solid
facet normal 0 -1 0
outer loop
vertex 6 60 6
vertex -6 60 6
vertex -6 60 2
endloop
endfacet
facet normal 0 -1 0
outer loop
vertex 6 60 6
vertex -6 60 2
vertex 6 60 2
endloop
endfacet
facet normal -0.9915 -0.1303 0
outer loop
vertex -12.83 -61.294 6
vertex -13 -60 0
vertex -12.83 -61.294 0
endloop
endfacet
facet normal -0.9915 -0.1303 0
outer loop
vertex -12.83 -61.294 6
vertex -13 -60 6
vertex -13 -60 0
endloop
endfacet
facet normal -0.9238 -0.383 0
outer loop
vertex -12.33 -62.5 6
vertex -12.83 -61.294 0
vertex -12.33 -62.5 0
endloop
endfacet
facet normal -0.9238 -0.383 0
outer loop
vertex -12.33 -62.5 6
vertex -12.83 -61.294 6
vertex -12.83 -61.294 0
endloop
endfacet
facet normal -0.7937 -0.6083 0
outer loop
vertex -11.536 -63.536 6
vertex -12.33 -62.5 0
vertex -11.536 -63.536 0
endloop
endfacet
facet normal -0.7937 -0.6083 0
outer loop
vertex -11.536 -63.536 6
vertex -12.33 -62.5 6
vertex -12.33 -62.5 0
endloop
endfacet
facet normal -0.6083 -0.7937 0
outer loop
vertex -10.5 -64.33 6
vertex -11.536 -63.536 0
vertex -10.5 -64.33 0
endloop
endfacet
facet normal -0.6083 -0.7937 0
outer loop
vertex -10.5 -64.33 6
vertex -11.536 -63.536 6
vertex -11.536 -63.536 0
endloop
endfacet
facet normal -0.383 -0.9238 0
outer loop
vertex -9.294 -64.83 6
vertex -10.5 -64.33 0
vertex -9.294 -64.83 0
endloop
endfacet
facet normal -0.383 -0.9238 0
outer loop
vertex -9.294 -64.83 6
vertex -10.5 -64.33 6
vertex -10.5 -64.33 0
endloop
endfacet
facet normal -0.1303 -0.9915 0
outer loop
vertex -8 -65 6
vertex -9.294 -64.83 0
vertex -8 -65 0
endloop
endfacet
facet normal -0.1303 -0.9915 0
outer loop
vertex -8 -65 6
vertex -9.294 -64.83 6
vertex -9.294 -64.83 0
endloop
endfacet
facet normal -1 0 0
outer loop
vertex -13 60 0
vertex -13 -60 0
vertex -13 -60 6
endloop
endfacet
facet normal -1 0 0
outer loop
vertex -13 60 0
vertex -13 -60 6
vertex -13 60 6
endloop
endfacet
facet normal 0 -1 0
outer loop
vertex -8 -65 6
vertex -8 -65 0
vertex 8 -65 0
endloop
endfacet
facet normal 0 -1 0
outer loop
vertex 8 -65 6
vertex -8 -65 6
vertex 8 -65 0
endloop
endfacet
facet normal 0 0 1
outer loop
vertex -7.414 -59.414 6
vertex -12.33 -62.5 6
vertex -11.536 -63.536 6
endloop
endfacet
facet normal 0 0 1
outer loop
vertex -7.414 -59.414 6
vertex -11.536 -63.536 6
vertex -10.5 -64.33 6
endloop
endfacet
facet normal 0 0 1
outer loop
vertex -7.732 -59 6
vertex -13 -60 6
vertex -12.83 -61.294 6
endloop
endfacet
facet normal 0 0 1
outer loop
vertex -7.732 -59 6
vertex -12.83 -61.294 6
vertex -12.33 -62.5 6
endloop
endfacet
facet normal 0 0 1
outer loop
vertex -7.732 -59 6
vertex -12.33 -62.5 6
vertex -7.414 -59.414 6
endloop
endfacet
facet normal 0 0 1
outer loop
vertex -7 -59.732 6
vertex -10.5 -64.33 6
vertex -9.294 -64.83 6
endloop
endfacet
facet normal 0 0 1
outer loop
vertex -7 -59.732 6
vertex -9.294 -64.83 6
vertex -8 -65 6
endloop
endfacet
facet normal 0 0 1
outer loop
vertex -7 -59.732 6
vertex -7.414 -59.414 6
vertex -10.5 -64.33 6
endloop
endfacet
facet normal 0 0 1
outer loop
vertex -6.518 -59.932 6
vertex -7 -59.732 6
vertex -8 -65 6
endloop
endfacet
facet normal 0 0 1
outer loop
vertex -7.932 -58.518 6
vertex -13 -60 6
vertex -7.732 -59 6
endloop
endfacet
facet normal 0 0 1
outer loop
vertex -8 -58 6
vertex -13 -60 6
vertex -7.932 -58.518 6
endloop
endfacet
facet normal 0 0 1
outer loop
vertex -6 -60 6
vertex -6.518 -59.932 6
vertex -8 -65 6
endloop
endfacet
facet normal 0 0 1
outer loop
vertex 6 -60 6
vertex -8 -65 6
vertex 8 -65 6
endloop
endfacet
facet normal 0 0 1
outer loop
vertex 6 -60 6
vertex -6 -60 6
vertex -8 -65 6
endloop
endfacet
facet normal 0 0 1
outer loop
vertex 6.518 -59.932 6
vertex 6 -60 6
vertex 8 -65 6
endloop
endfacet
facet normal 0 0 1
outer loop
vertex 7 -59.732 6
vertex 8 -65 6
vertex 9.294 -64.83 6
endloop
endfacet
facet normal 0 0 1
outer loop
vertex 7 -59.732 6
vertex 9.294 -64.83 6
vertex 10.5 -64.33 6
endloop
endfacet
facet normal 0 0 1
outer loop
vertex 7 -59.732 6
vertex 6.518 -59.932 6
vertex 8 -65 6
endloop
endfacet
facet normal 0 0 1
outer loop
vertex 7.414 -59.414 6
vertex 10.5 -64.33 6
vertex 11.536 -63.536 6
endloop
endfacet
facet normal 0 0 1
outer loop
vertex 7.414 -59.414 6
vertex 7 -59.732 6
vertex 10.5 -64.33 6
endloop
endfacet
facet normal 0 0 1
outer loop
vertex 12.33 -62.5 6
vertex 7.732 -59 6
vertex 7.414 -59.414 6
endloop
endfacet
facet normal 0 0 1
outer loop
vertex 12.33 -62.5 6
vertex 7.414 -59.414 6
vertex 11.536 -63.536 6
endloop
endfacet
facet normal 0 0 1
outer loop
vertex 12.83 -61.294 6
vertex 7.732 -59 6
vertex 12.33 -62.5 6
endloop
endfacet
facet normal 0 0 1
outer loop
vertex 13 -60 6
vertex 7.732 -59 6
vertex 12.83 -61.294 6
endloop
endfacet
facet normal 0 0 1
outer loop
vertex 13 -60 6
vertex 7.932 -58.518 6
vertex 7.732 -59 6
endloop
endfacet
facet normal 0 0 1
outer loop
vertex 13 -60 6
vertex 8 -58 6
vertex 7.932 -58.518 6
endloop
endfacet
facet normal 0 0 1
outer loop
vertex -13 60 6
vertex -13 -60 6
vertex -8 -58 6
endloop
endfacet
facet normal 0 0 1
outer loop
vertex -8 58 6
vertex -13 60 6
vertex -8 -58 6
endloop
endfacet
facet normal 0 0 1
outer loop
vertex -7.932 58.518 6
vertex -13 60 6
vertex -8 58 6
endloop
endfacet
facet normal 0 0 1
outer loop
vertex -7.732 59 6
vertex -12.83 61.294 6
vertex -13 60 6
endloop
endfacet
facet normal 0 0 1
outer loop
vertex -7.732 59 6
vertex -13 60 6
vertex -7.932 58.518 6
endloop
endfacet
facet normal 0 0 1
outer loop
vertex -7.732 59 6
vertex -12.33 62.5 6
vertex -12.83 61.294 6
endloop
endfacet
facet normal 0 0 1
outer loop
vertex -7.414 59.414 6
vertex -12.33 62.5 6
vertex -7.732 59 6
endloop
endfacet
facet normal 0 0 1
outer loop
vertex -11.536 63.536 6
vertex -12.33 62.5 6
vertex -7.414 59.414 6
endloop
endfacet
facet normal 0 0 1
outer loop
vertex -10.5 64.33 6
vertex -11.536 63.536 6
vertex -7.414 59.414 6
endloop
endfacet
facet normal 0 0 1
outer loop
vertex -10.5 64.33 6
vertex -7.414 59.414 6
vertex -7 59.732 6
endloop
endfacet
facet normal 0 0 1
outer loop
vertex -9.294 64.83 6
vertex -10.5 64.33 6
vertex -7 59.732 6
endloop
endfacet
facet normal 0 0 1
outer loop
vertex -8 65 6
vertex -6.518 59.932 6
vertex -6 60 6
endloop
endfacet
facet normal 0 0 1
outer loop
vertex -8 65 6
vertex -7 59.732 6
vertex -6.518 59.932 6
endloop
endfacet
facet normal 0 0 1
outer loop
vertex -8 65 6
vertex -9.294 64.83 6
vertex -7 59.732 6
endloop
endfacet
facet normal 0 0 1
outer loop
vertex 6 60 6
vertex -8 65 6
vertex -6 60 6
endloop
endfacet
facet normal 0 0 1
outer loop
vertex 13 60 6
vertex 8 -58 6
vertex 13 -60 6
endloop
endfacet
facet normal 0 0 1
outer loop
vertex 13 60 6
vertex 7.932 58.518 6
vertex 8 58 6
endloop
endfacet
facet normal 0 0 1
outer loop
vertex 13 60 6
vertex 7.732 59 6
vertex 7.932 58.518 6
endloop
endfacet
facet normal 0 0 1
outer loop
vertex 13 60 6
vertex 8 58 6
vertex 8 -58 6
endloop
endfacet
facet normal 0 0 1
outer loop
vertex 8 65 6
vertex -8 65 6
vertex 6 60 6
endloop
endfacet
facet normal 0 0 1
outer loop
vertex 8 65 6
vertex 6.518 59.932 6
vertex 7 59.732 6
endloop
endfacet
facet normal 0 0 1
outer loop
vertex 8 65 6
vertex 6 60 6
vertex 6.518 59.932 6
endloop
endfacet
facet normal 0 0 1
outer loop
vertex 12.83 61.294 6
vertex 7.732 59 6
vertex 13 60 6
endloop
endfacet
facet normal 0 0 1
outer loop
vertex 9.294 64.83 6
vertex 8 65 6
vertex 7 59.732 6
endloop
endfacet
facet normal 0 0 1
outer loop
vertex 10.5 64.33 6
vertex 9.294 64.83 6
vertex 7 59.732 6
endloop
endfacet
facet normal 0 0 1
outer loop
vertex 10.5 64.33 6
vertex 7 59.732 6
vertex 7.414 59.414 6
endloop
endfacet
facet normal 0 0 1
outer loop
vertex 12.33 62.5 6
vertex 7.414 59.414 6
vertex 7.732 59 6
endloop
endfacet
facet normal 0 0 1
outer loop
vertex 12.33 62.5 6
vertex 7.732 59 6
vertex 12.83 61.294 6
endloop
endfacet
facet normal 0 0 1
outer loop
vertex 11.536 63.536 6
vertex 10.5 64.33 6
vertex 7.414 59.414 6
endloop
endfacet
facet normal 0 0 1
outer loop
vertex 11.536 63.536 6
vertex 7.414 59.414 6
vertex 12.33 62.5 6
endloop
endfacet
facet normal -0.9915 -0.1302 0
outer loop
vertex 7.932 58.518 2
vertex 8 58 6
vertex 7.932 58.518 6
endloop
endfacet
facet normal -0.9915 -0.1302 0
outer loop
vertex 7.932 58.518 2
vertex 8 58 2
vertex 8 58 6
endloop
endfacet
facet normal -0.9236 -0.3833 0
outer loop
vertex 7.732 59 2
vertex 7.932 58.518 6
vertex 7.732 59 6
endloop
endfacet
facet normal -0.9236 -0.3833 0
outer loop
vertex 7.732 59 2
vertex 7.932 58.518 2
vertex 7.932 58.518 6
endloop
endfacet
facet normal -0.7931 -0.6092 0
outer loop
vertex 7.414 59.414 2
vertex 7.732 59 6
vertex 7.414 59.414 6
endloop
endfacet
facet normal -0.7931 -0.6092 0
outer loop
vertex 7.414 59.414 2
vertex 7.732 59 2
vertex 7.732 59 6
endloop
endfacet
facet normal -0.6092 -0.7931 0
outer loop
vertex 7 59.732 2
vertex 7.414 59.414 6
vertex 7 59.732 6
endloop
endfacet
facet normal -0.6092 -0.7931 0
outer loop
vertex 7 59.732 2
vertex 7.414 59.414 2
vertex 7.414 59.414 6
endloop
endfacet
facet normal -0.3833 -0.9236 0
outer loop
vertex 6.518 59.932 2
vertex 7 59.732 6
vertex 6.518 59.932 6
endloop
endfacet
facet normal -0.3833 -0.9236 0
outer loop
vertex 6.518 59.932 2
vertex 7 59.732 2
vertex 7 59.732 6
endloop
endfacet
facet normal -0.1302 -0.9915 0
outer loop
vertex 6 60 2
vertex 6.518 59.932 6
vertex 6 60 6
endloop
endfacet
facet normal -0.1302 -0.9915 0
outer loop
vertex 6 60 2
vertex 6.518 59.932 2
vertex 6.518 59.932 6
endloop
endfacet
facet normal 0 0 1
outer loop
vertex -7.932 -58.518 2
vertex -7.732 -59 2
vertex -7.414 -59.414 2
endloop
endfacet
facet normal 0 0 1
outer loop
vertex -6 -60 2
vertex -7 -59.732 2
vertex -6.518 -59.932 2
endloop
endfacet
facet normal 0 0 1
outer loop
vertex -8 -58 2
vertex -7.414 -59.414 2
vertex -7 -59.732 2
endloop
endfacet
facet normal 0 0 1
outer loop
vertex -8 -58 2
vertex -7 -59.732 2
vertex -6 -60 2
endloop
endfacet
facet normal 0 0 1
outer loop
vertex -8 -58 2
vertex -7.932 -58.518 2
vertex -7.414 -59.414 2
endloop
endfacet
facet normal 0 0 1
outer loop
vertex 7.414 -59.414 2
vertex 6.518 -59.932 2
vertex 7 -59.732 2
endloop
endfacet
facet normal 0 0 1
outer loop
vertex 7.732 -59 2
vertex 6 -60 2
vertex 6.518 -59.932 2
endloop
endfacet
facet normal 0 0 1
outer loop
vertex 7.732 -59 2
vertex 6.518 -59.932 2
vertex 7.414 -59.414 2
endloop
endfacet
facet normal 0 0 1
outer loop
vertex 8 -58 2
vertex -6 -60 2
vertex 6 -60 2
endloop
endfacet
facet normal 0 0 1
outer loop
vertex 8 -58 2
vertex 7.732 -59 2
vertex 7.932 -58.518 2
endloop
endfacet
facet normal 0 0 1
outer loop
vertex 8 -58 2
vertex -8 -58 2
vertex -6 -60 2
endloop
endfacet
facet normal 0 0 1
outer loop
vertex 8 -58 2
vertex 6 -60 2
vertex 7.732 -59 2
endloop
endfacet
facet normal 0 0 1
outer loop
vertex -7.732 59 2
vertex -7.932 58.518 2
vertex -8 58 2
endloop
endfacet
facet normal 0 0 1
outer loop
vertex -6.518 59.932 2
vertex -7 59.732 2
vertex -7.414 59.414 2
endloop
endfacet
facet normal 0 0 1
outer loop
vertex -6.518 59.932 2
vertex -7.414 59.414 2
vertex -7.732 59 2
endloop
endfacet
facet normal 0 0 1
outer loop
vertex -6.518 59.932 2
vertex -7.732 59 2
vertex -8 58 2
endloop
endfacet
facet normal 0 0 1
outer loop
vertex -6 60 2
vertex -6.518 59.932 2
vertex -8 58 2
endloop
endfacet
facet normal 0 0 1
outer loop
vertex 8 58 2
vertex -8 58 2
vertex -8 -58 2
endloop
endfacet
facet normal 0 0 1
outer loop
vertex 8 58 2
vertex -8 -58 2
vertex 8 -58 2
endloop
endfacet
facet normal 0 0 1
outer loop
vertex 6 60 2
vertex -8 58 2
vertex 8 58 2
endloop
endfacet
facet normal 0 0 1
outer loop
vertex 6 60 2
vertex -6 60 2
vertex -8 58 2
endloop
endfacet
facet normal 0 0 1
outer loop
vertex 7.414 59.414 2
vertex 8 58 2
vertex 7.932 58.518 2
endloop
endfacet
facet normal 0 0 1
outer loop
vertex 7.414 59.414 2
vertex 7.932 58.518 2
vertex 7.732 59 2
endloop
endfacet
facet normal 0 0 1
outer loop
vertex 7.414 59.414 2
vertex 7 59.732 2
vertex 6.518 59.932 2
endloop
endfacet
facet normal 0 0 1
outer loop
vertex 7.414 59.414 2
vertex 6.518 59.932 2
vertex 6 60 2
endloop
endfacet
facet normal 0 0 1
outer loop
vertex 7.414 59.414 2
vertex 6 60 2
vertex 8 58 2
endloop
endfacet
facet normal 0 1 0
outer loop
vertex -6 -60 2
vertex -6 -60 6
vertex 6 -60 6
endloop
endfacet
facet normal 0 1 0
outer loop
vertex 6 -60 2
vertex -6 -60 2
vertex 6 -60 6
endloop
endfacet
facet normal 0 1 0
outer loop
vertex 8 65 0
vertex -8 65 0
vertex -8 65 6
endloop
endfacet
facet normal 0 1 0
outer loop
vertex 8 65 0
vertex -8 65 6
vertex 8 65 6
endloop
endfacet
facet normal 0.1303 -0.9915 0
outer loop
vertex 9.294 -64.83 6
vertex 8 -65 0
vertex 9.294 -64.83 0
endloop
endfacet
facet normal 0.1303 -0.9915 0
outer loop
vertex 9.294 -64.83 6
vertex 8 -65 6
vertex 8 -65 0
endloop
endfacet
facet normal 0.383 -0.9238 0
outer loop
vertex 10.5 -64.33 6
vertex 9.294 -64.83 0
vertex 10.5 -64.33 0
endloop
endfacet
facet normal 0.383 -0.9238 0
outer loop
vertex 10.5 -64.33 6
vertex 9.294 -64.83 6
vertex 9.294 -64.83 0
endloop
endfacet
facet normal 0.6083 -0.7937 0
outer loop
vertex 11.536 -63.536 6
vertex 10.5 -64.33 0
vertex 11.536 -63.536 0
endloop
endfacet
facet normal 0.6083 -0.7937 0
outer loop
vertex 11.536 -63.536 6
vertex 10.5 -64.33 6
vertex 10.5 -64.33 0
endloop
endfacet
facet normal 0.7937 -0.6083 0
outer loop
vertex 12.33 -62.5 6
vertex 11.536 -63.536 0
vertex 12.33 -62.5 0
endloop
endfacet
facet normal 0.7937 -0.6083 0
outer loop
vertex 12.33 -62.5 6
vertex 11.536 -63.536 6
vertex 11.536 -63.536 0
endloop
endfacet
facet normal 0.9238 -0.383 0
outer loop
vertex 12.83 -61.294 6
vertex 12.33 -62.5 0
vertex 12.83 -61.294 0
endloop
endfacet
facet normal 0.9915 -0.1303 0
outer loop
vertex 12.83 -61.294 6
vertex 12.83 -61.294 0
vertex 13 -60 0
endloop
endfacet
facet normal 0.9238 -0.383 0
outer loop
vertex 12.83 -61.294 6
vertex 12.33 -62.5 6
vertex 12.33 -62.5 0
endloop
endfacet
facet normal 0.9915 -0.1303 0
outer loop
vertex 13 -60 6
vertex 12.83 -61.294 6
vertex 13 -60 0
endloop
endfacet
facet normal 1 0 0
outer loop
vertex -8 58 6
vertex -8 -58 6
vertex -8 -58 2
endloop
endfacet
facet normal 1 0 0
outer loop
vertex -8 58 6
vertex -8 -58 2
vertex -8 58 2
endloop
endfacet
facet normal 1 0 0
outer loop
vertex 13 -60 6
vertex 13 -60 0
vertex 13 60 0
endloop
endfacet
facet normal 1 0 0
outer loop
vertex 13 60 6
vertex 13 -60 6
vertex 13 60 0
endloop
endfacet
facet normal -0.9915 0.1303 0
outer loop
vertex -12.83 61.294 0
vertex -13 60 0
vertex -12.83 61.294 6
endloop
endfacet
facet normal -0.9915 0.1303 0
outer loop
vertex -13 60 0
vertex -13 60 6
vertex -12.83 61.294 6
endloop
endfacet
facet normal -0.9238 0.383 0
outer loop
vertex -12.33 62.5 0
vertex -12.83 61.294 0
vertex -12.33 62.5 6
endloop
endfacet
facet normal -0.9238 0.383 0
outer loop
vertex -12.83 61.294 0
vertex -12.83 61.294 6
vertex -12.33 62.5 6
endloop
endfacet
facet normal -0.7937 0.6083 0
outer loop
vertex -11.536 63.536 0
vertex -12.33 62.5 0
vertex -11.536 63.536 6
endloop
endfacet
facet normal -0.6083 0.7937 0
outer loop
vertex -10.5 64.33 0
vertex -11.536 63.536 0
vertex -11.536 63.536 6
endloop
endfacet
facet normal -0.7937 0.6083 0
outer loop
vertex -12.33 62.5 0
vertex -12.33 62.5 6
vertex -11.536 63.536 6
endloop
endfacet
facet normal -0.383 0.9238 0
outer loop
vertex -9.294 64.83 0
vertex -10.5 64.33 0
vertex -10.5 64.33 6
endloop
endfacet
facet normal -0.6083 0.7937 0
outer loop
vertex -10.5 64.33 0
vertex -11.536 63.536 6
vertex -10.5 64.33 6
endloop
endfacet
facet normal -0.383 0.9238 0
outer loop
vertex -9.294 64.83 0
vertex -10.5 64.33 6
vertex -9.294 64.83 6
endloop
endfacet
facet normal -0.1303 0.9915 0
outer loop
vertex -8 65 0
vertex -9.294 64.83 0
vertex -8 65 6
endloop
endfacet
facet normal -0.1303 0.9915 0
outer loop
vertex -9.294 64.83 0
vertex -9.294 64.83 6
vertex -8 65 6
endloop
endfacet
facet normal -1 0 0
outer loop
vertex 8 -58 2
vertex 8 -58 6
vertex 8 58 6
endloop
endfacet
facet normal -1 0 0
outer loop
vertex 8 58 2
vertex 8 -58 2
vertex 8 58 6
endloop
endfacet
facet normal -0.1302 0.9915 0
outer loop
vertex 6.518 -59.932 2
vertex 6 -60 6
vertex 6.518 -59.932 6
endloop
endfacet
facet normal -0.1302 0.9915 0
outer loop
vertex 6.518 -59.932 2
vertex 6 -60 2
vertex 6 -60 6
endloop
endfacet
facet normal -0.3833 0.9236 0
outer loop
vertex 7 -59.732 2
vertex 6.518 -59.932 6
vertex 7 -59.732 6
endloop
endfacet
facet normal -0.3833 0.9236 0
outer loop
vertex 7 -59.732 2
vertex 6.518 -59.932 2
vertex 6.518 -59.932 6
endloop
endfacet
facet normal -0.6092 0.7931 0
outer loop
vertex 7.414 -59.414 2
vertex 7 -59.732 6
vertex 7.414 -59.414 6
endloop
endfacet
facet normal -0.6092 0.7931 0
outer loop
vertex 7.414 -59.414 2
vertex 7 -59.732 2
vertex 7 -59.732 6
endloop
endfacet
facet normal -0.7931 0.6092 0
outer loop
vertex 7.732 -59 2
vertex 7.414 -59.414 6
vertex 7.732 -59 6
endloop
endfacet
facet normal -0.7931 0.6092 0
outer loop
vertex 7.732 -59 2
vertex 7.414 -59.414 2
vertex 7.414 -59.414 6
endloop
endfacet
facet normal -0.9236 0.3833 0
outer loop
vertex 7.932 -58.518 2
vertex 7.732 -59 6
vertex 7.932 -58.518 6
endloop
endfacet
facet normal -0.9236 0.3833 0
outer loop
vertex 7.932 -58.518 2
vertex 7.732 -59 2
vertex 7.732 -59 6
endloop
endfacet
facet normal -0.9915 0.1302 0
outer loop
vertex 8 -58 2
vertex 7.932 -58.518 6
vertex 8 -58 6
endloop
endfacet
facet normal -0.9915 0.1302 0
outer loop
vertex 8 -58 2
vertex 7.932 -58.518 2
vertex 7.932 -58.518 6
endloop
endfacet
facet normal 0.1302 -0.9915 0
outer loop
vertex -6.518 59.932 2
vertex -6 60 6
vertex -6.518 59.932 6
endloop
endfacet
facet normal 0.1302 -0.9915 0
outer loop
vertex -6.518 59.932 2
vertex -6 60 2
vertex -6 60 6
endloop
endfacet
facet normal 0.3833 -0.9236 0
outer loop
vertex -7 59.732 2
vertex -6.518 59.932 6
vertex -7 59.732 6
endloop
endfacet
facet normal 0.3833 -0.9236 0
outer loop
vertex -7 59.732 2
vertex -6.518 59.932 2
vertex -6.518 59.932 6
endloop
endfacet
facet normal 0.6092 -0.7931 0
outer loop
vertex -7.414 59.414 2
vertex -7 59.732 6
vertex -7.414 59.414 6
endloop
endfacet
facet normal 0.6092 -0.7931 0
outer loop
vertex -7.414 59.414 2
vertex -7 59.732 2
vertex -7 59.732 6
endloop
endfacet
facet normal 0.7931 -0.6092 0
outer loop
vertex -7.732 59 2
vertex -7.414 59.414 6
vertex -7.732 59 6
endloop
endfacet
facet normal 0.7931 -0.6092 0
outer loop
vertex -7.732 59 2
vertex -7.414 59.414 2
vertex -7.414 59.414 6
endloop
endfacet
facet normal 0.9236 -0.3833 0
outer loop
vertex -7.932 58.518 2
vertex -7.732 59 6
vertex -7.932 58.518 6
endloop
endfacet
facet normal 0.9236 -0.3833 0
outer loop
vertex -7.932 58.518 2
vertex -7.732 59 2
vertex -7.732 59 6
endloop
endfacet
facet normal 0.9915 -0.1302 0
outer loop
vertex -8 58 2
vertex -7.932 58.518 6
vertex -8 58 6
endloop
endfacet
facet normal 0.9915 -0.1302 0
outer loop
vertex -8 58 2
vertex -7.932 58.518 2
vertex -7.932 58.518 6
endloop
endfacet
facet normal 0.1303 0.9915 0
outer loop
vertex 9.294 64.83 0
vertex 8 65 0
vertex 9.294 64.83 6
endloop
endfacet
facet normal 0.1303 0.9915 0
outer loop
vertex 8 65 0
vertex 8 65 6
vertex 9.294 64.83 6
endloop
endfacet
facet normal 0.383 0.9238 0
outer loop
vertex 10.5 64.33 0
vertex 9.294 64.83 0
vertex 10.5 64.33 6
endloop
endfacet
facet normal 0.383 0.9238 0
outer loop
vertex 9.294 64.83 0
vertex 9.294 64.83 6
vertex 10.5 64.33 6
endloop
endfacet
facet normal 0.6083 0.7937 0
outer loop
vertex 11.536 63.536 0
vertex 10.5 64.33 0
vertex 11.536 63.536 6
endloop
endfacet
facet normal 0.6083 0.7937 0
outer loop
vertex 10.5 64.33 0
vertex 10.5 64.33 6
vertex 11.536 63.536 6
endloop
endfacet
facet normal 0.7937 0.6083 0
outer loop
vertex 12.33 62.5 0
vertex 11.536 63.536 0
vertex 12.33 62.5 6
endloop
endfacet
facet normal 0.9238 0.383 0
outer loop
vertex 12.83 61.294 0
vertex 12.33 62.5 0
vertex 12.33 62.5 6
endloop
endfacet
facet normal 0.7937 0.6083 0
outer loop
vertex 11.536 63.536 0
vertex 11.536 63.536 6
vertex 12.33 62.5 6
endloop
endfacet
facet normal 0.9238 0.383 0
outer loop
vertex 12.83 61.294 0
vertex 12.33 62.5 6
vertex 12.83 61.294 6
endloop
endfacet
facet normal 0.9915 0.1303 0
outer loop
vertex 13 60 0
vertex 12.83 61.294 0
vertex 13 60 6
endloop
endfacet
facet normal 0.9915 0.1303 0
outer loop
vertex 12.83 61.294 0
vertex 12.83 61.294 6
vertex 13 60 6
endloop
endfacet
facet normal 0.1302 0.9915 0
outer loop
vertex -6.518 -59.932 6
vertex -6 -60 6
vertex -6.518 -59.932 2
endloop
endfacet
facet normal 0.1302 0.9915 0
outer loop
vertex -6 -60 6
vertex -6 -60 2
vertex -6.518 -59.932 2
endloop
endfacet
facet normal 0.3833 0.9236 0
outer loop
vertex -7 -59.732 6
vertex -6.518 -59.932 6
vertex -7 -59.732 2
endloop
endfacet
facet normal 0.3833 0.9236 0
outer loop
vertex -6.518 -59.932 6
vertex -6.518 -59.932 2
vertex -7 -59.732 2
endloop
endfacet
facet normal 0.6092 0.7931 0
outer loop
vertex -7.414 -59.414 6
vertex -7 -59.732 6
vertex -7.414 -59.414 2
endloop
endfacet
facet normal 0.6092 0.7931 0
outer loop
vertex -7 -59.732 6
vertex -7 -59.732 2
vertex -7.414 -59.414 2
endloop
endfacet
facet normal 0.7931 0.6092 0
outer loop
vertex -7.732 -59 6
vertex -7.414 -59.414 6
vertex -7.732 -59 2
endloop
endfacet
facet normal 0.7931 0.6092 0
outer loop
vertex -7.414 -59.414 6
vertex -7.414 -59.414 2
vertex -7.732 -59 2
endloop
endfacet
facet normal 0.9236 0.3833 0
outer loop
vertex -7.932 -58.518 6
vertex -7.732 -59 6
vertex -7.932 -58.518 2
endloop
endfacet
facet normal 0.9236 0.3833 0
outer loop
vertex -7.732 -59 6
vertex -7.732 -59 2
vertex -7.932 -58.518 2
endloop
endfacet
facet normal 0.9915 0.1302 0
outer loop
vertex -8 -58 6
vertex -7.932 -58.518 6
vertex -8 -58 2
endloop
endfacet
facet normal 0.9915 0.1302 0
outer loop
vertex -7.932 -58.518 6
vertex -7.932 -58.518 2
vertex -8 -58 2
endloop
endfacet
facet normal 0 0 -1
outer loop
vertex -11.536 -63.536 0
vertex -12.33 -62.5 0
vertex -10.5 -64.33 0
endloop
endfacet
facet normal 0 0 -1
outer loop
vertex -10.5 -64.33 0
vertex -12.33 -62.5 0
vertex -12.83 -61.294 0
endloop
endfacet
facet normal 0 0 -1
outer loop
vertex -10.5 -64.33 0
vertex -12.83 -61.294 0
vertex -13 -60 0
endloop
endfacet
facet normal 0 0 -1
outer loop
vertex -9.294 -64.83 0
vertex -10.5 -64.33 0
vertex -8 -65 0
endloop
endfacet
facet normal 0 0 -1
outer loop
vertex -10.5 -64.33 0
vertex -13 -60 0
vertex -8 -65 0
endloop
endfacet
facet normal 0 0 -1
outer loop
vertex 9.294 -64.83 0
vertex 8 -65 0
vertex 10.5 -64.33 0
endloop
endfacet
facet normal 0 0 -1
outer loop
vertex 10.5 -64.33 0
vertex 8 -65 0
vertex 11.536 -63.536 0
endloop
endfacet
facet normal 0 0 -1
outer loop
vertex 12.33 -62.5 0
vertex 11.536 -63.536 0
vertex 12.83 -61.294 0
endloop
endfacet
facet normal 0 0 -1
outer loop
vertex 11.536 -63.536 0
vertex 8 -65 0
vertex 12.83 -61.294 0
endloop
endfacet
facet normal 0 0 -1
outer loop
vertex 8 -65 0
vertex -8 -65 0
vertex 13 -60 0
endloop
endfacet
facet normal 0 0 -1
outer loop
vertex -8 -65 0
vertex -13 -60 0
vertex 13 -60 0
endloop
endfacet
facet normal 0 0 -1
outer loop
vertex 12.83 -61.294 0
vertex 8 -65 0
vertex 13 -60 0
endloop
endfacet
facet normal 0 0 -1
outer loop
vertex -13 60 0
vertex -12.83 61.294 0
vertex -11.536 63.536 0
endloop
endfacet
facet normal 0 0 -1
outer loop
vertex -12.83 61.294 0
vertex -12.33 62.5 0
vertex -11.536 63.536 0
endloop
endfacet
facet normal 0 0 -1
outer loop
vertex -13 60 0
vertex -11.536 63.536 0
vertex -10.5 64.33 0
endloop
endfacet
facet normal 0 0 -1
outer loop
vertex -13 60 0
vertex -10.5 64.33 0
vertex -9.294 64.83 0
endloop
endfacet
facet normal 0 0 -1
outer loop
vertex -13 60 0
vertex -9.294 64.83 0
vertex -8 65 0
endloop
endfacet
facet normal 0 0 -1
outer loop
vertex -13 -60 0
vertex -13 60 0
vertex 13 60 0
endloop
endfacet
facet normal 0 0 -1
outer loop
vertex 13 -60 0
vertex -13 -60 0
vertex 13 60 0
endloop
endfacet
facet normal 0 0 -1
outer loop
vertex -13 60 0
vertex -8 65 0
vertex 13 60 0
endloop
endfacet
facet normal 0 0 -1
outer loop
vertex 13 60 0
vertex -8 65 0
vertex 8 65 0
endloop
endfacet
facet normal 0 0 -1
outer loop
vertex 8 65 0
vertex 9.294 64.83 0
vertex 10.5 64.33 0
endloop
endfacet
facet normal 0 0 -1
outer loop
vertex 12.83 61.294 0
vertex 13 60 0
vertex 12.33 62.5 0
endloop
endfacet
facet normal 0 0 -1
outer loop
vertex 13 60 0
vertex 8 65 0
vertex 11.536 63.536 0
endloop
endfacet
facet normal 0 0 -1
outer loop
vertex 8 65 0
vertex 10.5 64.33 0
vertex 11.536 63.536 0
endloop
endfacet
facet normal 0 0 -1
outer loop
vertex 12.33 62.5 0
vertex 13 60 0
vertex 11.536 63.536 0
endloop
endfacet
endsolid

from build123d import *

# Parameters (mm, degrees)
F0_W     = 26
F0_H     = 130
F1_DEPTH = 6
F2_W     = 16
F2_H     = 120
F3_DEPTH = 4
F4_R     = 2
F5_R     = 5


with BuildPart() as f1:
    # F0 (on Top) → F1 (new body)
    with BuildSketch(Plane.XY):
        Rectangle(F0_W, F0_H)
    extrude(amount=F1_DEPTH)

    # F2 (on face) → F3 (cut)
    with BuildSketch(Plane.XY.offset(6)):
        Rectangle(F2_W, F2_H)
    extrude(amount=-F3_DEPTH, mode=Mode.SUBTRACT)

    # F4
    f4_edges = [f1.edges().sort_by_distance(p)[0] for p in [
        (-8, 60, 4),
        (-8, -60, 4),
        (8, -60, 4),
        (8, 60, 4),
    ]]
    fillet(f4_edges, radius=F4_R)

    # F5
    f5_edges = [f1.edges().sort_by_distance(p)[0] for p in [
        (-13, -65, 3),
        (13, -65, 3),
        (13, 65, 3),
        (-13, 65, 3),
    ]]
    fillet(f5_edges, radius=F5_R)


solid = f1.part
